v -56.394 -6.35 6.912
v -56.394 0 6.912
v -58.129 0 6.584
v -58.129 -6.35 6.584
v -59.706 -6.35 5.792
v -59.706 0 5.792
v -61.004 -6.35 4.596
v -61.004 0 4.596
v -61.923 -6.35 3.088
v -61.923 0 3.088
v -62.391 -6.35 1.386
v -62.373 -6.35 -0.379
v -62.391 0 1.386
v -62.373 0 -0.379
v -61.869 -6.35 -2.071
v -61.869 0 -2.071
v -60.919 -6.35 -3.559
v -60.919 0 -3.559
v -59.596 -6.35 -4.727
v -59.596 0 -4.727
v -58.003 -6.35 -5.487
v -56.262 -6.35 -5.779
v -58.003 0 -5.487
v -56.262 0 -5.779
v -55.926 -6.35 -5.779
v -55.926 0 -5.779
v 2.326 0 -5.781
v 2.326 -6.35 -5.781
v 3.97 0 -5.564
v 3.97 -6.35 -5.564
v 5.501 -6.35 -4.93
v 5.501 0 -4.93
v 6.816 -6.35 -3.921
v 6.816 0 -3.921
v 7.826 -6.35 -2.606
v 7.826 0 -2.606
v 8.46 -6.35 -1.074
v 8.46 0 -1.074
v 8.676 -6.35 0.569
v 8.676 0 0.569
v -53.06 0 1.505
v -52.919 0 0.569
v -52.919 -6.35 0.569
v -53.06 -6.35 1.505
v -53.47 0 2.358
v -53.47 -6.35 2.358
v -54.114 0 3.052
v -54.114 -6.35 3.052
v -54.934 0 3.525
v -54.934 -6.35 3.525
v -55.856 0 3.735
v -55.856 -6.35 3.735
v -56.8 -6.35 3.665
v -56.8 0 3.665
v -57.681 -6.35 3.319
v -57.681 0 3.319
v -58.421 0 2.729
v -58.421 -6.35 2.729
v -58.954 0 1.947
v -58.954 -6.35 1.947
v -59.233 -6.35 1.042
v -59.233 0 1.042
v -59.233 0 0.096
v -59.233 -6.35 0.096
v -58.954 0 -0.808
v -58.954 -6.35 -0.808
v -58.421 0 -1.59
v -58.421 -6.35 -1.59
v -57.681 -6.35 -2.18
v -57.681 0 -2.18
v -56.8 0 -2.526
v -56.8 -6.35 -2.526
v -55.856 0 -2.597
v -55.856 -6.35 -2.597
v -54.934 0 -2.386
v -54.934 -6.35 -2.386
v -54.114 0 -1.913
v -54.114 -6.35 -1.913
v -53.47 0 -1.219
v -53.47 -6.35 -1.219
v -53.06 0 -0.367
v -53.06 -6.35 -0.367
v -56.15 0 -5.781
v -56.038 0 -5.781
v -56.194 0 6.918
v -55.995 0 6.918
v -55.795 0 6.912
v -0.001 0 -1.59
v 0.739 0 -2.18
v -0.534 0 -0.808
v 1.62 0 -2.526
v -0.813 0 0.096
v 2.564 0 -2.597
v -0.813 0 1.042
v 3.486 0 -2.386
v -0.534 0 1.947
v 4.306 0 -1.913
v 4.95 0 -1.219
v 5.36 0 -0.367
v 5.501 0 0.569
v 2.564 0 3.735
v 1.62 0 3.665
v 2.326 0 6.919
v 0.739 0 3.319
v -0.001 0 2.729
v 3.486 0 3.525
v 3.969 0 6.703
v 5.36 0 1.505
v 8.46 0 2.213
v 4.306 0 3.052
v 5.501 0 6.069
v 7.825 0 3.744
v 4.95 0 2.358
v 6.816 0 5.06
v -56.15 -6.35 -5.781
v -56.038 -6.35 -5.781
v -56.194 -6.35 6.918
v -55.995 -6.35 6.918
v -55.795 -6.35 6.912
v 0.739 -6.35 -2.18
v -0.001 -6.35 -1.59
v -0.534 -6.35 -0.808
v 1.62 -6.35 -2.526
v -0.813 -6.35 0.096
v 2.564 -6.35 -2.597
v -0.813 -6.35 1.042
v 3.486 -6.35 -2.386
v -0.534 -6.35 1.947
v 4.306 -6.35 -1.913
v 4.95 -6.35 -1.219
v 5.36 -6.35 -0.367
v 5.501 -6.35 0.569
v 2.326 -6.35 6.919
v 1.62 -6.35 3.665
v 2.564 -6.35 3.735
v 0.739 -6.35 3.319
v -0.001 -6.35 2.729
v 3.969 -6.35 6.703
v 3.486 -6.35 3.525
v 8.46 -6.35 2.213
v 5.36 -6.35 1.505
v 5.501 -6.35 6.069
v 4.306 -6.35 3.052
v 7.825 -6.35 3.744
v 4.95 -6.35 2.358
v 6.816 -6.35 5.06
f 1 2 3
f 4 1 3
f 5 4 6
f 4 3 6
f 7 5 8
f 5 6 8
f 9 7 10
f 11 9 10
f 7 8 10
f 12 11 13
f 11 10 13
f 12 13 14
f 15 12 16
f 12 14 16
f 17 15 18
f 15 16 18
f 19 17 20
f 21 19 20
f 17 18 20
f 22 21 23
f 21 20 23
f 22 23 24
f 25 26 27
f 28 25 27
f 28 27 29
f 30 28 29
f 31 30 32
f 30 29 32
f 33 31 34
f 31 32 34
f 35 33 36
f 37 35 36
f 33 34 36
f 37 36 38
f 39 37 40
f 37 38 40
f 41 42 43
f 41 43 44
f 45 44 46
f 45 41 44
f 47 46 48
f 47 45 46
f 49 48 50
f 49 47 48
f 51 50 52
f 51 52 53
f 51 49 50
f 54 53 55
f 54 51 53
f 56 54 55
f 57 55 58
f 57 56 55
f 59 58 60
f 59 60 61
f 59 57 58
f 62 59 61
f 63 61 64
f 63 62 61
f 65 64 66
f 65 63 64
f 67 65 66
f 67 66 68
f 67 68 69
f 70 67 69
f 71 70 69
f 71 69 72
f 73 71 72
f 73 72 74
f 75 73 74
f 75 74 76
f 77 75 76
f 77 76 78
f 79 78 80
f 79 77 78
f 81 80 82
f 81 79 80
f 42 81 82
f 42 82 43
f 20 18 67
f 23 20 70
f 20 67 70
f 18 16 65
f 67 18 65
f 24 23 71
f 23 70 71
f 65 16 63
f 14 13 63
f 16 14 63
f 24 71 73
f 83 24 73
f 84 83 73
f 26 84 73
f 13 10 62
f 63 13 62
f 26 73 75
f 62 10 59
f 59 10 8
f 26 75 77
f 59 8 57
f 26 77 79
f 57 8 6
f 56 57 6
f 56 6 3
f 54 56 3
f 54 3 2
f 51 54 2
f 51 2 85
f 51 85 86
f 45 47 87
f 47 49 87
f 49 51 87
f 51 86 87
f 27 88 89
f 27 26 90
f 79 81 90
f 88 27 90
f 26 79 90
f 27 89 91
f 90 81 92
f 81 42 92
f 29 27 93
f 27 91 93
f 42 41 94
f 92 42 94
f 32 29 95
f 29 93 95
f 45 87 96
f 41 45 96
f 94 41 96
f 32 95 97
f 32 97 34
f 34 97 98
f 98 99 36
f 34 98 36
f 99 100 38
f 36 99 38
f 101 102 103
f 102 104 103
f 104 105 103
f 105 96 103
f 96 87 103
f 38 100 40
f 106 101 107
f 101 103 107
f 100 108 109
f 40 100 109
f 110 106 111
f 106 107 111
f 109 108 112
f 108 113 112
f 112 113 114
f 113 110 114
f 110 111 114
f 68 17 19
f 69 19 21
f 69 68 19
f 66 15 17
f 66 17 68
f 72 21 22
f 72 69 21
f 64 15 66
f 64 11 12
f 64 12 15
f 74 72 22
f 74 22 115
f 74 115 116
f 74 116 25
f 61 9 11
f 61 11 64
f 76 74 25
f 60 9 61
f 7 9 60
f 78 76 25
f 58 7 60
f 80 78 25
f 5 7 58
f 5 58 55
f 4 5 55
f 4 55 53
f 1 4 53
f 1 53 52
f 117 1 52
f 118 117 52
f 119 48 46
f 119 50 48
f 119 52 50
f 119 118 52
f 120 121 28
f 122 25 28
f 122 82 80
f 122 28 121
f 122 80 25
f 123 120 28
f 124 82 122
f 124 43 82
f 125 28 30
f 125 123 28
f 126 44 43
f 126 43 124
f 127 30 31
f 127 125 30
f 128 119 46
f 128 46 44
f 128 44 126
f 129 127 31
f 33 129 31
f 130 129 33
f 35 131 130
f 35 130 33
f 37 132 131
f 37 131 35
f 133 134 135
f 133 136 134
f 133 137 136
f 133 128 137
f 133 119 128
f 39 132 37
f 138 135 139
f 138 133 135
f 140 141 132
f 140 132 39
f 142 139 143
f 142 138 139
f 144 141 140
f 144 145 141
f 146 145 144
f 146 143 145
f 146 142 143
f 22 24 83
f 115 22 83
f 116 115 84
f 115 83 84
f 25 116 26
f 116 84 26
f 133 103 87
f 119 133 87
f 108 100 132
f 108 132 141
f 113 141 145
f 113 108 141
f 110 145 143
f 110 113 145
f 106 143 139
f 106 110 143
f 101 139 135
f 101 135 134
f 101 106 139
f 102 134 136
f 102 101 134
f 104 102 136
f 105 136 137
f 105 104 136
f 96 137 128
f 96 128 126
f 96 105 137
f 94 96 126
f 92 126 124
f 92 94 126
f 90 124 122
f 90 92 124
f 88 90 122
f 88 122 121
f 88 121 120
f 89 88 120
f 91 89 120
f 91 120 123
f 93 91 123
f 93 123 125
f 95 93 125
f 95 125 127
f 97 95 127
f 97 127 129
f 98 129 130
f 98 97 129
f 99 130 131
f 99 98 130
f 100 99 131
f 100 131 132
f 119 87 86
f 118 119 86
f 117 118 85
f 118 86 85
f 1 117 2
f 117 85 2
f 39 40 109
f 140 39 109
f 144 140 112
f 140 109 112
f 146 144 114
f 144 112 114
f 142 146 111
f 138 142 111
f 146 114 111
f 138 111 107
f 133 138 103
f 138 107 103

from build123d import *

# Parameters (mm, degrees)
F0_R     = 3.175
F1_DEPTH = 6.35


with BuildPart() as f1:
    # F0 (on Front) → F1 (new body)
    with BuildSketch(Plane.XZ):
        with BuildLine():
            Line((-55.794907, 6.912166), (-56.393981, 6.912093))
            ThreePointArc((-56.393981, 6.912093), (-62.443332, 0.503062), (-56.261799, -5.778576))
            Line((-56.261799, -5.778576), (-55.926036, -5.778589))
            ThreePointArc((-55.926036, -5.778589), (-51.544664, -3.861264), (-49.743676, 0.569198))
            ThreePointArc((-49.743676, 0.569198), (-51.499131, 4.952423), (-55.794907, 6.912166))
        make_face()
        with Locations((-56.093676, 0.569198)):
            Circle(F0_R, mode=Mode.SUBTRACT)
        with BuildLine():
            ThreePointArc((-55.794907, 6.912166), (-56.094445, 6.919198), (-56.393981, 6.912093))
            Line((-56.393981, 6.912093), (-55.794907, 6.912166))
        make_face()
        with BuildLine():
            Line((-55.926036, -5.778589), (-56.261799, -5.778576))
            ThreePointArc((-56.261799, -5.778576), (-56.093917, -5.780802), (-55.926036, -5.778589))
        make_face()
        with BuildLine():
            Line((2.325555, 6.919198), (-55.794907, 6.912166))
            ThreePointArc((-55.794907, 6.912166), (-51.499131, 4.952423), (-49.743676, 0.569198))
            ThreePointArc((-49.743676, 0.569198), (-51.544664, -3.861264), (-55.926036, -5.778589))
            Line((-55.926036, -5.778589), (2.326083, -5.780802))
            ThreePointArc((2.326083, -5.780802), (-4.023676, 0.568935), (2.325555, 6.919198))
        make_face()
        with BuildLine():
            ThreePointArc((8.676324, 0.569198), (6.81618, 5.059598), (2.325555, 6.919198))
            ThreePointArc((2.325555, 6.919198), (-4.023676, 0.568935), (2.326083, -5.780802))
            ThreePointArc((2.326083, -5.780802), (6.816367, -3.921015), (8.676324, 0.569198))
        make_face()
        with Locations((2.326324, 0.569198)):
            Circle(F0_R, mode=Mode.SUBTRACT)
    extrude(amount=F1_DEPTH)


solid = f1.part
